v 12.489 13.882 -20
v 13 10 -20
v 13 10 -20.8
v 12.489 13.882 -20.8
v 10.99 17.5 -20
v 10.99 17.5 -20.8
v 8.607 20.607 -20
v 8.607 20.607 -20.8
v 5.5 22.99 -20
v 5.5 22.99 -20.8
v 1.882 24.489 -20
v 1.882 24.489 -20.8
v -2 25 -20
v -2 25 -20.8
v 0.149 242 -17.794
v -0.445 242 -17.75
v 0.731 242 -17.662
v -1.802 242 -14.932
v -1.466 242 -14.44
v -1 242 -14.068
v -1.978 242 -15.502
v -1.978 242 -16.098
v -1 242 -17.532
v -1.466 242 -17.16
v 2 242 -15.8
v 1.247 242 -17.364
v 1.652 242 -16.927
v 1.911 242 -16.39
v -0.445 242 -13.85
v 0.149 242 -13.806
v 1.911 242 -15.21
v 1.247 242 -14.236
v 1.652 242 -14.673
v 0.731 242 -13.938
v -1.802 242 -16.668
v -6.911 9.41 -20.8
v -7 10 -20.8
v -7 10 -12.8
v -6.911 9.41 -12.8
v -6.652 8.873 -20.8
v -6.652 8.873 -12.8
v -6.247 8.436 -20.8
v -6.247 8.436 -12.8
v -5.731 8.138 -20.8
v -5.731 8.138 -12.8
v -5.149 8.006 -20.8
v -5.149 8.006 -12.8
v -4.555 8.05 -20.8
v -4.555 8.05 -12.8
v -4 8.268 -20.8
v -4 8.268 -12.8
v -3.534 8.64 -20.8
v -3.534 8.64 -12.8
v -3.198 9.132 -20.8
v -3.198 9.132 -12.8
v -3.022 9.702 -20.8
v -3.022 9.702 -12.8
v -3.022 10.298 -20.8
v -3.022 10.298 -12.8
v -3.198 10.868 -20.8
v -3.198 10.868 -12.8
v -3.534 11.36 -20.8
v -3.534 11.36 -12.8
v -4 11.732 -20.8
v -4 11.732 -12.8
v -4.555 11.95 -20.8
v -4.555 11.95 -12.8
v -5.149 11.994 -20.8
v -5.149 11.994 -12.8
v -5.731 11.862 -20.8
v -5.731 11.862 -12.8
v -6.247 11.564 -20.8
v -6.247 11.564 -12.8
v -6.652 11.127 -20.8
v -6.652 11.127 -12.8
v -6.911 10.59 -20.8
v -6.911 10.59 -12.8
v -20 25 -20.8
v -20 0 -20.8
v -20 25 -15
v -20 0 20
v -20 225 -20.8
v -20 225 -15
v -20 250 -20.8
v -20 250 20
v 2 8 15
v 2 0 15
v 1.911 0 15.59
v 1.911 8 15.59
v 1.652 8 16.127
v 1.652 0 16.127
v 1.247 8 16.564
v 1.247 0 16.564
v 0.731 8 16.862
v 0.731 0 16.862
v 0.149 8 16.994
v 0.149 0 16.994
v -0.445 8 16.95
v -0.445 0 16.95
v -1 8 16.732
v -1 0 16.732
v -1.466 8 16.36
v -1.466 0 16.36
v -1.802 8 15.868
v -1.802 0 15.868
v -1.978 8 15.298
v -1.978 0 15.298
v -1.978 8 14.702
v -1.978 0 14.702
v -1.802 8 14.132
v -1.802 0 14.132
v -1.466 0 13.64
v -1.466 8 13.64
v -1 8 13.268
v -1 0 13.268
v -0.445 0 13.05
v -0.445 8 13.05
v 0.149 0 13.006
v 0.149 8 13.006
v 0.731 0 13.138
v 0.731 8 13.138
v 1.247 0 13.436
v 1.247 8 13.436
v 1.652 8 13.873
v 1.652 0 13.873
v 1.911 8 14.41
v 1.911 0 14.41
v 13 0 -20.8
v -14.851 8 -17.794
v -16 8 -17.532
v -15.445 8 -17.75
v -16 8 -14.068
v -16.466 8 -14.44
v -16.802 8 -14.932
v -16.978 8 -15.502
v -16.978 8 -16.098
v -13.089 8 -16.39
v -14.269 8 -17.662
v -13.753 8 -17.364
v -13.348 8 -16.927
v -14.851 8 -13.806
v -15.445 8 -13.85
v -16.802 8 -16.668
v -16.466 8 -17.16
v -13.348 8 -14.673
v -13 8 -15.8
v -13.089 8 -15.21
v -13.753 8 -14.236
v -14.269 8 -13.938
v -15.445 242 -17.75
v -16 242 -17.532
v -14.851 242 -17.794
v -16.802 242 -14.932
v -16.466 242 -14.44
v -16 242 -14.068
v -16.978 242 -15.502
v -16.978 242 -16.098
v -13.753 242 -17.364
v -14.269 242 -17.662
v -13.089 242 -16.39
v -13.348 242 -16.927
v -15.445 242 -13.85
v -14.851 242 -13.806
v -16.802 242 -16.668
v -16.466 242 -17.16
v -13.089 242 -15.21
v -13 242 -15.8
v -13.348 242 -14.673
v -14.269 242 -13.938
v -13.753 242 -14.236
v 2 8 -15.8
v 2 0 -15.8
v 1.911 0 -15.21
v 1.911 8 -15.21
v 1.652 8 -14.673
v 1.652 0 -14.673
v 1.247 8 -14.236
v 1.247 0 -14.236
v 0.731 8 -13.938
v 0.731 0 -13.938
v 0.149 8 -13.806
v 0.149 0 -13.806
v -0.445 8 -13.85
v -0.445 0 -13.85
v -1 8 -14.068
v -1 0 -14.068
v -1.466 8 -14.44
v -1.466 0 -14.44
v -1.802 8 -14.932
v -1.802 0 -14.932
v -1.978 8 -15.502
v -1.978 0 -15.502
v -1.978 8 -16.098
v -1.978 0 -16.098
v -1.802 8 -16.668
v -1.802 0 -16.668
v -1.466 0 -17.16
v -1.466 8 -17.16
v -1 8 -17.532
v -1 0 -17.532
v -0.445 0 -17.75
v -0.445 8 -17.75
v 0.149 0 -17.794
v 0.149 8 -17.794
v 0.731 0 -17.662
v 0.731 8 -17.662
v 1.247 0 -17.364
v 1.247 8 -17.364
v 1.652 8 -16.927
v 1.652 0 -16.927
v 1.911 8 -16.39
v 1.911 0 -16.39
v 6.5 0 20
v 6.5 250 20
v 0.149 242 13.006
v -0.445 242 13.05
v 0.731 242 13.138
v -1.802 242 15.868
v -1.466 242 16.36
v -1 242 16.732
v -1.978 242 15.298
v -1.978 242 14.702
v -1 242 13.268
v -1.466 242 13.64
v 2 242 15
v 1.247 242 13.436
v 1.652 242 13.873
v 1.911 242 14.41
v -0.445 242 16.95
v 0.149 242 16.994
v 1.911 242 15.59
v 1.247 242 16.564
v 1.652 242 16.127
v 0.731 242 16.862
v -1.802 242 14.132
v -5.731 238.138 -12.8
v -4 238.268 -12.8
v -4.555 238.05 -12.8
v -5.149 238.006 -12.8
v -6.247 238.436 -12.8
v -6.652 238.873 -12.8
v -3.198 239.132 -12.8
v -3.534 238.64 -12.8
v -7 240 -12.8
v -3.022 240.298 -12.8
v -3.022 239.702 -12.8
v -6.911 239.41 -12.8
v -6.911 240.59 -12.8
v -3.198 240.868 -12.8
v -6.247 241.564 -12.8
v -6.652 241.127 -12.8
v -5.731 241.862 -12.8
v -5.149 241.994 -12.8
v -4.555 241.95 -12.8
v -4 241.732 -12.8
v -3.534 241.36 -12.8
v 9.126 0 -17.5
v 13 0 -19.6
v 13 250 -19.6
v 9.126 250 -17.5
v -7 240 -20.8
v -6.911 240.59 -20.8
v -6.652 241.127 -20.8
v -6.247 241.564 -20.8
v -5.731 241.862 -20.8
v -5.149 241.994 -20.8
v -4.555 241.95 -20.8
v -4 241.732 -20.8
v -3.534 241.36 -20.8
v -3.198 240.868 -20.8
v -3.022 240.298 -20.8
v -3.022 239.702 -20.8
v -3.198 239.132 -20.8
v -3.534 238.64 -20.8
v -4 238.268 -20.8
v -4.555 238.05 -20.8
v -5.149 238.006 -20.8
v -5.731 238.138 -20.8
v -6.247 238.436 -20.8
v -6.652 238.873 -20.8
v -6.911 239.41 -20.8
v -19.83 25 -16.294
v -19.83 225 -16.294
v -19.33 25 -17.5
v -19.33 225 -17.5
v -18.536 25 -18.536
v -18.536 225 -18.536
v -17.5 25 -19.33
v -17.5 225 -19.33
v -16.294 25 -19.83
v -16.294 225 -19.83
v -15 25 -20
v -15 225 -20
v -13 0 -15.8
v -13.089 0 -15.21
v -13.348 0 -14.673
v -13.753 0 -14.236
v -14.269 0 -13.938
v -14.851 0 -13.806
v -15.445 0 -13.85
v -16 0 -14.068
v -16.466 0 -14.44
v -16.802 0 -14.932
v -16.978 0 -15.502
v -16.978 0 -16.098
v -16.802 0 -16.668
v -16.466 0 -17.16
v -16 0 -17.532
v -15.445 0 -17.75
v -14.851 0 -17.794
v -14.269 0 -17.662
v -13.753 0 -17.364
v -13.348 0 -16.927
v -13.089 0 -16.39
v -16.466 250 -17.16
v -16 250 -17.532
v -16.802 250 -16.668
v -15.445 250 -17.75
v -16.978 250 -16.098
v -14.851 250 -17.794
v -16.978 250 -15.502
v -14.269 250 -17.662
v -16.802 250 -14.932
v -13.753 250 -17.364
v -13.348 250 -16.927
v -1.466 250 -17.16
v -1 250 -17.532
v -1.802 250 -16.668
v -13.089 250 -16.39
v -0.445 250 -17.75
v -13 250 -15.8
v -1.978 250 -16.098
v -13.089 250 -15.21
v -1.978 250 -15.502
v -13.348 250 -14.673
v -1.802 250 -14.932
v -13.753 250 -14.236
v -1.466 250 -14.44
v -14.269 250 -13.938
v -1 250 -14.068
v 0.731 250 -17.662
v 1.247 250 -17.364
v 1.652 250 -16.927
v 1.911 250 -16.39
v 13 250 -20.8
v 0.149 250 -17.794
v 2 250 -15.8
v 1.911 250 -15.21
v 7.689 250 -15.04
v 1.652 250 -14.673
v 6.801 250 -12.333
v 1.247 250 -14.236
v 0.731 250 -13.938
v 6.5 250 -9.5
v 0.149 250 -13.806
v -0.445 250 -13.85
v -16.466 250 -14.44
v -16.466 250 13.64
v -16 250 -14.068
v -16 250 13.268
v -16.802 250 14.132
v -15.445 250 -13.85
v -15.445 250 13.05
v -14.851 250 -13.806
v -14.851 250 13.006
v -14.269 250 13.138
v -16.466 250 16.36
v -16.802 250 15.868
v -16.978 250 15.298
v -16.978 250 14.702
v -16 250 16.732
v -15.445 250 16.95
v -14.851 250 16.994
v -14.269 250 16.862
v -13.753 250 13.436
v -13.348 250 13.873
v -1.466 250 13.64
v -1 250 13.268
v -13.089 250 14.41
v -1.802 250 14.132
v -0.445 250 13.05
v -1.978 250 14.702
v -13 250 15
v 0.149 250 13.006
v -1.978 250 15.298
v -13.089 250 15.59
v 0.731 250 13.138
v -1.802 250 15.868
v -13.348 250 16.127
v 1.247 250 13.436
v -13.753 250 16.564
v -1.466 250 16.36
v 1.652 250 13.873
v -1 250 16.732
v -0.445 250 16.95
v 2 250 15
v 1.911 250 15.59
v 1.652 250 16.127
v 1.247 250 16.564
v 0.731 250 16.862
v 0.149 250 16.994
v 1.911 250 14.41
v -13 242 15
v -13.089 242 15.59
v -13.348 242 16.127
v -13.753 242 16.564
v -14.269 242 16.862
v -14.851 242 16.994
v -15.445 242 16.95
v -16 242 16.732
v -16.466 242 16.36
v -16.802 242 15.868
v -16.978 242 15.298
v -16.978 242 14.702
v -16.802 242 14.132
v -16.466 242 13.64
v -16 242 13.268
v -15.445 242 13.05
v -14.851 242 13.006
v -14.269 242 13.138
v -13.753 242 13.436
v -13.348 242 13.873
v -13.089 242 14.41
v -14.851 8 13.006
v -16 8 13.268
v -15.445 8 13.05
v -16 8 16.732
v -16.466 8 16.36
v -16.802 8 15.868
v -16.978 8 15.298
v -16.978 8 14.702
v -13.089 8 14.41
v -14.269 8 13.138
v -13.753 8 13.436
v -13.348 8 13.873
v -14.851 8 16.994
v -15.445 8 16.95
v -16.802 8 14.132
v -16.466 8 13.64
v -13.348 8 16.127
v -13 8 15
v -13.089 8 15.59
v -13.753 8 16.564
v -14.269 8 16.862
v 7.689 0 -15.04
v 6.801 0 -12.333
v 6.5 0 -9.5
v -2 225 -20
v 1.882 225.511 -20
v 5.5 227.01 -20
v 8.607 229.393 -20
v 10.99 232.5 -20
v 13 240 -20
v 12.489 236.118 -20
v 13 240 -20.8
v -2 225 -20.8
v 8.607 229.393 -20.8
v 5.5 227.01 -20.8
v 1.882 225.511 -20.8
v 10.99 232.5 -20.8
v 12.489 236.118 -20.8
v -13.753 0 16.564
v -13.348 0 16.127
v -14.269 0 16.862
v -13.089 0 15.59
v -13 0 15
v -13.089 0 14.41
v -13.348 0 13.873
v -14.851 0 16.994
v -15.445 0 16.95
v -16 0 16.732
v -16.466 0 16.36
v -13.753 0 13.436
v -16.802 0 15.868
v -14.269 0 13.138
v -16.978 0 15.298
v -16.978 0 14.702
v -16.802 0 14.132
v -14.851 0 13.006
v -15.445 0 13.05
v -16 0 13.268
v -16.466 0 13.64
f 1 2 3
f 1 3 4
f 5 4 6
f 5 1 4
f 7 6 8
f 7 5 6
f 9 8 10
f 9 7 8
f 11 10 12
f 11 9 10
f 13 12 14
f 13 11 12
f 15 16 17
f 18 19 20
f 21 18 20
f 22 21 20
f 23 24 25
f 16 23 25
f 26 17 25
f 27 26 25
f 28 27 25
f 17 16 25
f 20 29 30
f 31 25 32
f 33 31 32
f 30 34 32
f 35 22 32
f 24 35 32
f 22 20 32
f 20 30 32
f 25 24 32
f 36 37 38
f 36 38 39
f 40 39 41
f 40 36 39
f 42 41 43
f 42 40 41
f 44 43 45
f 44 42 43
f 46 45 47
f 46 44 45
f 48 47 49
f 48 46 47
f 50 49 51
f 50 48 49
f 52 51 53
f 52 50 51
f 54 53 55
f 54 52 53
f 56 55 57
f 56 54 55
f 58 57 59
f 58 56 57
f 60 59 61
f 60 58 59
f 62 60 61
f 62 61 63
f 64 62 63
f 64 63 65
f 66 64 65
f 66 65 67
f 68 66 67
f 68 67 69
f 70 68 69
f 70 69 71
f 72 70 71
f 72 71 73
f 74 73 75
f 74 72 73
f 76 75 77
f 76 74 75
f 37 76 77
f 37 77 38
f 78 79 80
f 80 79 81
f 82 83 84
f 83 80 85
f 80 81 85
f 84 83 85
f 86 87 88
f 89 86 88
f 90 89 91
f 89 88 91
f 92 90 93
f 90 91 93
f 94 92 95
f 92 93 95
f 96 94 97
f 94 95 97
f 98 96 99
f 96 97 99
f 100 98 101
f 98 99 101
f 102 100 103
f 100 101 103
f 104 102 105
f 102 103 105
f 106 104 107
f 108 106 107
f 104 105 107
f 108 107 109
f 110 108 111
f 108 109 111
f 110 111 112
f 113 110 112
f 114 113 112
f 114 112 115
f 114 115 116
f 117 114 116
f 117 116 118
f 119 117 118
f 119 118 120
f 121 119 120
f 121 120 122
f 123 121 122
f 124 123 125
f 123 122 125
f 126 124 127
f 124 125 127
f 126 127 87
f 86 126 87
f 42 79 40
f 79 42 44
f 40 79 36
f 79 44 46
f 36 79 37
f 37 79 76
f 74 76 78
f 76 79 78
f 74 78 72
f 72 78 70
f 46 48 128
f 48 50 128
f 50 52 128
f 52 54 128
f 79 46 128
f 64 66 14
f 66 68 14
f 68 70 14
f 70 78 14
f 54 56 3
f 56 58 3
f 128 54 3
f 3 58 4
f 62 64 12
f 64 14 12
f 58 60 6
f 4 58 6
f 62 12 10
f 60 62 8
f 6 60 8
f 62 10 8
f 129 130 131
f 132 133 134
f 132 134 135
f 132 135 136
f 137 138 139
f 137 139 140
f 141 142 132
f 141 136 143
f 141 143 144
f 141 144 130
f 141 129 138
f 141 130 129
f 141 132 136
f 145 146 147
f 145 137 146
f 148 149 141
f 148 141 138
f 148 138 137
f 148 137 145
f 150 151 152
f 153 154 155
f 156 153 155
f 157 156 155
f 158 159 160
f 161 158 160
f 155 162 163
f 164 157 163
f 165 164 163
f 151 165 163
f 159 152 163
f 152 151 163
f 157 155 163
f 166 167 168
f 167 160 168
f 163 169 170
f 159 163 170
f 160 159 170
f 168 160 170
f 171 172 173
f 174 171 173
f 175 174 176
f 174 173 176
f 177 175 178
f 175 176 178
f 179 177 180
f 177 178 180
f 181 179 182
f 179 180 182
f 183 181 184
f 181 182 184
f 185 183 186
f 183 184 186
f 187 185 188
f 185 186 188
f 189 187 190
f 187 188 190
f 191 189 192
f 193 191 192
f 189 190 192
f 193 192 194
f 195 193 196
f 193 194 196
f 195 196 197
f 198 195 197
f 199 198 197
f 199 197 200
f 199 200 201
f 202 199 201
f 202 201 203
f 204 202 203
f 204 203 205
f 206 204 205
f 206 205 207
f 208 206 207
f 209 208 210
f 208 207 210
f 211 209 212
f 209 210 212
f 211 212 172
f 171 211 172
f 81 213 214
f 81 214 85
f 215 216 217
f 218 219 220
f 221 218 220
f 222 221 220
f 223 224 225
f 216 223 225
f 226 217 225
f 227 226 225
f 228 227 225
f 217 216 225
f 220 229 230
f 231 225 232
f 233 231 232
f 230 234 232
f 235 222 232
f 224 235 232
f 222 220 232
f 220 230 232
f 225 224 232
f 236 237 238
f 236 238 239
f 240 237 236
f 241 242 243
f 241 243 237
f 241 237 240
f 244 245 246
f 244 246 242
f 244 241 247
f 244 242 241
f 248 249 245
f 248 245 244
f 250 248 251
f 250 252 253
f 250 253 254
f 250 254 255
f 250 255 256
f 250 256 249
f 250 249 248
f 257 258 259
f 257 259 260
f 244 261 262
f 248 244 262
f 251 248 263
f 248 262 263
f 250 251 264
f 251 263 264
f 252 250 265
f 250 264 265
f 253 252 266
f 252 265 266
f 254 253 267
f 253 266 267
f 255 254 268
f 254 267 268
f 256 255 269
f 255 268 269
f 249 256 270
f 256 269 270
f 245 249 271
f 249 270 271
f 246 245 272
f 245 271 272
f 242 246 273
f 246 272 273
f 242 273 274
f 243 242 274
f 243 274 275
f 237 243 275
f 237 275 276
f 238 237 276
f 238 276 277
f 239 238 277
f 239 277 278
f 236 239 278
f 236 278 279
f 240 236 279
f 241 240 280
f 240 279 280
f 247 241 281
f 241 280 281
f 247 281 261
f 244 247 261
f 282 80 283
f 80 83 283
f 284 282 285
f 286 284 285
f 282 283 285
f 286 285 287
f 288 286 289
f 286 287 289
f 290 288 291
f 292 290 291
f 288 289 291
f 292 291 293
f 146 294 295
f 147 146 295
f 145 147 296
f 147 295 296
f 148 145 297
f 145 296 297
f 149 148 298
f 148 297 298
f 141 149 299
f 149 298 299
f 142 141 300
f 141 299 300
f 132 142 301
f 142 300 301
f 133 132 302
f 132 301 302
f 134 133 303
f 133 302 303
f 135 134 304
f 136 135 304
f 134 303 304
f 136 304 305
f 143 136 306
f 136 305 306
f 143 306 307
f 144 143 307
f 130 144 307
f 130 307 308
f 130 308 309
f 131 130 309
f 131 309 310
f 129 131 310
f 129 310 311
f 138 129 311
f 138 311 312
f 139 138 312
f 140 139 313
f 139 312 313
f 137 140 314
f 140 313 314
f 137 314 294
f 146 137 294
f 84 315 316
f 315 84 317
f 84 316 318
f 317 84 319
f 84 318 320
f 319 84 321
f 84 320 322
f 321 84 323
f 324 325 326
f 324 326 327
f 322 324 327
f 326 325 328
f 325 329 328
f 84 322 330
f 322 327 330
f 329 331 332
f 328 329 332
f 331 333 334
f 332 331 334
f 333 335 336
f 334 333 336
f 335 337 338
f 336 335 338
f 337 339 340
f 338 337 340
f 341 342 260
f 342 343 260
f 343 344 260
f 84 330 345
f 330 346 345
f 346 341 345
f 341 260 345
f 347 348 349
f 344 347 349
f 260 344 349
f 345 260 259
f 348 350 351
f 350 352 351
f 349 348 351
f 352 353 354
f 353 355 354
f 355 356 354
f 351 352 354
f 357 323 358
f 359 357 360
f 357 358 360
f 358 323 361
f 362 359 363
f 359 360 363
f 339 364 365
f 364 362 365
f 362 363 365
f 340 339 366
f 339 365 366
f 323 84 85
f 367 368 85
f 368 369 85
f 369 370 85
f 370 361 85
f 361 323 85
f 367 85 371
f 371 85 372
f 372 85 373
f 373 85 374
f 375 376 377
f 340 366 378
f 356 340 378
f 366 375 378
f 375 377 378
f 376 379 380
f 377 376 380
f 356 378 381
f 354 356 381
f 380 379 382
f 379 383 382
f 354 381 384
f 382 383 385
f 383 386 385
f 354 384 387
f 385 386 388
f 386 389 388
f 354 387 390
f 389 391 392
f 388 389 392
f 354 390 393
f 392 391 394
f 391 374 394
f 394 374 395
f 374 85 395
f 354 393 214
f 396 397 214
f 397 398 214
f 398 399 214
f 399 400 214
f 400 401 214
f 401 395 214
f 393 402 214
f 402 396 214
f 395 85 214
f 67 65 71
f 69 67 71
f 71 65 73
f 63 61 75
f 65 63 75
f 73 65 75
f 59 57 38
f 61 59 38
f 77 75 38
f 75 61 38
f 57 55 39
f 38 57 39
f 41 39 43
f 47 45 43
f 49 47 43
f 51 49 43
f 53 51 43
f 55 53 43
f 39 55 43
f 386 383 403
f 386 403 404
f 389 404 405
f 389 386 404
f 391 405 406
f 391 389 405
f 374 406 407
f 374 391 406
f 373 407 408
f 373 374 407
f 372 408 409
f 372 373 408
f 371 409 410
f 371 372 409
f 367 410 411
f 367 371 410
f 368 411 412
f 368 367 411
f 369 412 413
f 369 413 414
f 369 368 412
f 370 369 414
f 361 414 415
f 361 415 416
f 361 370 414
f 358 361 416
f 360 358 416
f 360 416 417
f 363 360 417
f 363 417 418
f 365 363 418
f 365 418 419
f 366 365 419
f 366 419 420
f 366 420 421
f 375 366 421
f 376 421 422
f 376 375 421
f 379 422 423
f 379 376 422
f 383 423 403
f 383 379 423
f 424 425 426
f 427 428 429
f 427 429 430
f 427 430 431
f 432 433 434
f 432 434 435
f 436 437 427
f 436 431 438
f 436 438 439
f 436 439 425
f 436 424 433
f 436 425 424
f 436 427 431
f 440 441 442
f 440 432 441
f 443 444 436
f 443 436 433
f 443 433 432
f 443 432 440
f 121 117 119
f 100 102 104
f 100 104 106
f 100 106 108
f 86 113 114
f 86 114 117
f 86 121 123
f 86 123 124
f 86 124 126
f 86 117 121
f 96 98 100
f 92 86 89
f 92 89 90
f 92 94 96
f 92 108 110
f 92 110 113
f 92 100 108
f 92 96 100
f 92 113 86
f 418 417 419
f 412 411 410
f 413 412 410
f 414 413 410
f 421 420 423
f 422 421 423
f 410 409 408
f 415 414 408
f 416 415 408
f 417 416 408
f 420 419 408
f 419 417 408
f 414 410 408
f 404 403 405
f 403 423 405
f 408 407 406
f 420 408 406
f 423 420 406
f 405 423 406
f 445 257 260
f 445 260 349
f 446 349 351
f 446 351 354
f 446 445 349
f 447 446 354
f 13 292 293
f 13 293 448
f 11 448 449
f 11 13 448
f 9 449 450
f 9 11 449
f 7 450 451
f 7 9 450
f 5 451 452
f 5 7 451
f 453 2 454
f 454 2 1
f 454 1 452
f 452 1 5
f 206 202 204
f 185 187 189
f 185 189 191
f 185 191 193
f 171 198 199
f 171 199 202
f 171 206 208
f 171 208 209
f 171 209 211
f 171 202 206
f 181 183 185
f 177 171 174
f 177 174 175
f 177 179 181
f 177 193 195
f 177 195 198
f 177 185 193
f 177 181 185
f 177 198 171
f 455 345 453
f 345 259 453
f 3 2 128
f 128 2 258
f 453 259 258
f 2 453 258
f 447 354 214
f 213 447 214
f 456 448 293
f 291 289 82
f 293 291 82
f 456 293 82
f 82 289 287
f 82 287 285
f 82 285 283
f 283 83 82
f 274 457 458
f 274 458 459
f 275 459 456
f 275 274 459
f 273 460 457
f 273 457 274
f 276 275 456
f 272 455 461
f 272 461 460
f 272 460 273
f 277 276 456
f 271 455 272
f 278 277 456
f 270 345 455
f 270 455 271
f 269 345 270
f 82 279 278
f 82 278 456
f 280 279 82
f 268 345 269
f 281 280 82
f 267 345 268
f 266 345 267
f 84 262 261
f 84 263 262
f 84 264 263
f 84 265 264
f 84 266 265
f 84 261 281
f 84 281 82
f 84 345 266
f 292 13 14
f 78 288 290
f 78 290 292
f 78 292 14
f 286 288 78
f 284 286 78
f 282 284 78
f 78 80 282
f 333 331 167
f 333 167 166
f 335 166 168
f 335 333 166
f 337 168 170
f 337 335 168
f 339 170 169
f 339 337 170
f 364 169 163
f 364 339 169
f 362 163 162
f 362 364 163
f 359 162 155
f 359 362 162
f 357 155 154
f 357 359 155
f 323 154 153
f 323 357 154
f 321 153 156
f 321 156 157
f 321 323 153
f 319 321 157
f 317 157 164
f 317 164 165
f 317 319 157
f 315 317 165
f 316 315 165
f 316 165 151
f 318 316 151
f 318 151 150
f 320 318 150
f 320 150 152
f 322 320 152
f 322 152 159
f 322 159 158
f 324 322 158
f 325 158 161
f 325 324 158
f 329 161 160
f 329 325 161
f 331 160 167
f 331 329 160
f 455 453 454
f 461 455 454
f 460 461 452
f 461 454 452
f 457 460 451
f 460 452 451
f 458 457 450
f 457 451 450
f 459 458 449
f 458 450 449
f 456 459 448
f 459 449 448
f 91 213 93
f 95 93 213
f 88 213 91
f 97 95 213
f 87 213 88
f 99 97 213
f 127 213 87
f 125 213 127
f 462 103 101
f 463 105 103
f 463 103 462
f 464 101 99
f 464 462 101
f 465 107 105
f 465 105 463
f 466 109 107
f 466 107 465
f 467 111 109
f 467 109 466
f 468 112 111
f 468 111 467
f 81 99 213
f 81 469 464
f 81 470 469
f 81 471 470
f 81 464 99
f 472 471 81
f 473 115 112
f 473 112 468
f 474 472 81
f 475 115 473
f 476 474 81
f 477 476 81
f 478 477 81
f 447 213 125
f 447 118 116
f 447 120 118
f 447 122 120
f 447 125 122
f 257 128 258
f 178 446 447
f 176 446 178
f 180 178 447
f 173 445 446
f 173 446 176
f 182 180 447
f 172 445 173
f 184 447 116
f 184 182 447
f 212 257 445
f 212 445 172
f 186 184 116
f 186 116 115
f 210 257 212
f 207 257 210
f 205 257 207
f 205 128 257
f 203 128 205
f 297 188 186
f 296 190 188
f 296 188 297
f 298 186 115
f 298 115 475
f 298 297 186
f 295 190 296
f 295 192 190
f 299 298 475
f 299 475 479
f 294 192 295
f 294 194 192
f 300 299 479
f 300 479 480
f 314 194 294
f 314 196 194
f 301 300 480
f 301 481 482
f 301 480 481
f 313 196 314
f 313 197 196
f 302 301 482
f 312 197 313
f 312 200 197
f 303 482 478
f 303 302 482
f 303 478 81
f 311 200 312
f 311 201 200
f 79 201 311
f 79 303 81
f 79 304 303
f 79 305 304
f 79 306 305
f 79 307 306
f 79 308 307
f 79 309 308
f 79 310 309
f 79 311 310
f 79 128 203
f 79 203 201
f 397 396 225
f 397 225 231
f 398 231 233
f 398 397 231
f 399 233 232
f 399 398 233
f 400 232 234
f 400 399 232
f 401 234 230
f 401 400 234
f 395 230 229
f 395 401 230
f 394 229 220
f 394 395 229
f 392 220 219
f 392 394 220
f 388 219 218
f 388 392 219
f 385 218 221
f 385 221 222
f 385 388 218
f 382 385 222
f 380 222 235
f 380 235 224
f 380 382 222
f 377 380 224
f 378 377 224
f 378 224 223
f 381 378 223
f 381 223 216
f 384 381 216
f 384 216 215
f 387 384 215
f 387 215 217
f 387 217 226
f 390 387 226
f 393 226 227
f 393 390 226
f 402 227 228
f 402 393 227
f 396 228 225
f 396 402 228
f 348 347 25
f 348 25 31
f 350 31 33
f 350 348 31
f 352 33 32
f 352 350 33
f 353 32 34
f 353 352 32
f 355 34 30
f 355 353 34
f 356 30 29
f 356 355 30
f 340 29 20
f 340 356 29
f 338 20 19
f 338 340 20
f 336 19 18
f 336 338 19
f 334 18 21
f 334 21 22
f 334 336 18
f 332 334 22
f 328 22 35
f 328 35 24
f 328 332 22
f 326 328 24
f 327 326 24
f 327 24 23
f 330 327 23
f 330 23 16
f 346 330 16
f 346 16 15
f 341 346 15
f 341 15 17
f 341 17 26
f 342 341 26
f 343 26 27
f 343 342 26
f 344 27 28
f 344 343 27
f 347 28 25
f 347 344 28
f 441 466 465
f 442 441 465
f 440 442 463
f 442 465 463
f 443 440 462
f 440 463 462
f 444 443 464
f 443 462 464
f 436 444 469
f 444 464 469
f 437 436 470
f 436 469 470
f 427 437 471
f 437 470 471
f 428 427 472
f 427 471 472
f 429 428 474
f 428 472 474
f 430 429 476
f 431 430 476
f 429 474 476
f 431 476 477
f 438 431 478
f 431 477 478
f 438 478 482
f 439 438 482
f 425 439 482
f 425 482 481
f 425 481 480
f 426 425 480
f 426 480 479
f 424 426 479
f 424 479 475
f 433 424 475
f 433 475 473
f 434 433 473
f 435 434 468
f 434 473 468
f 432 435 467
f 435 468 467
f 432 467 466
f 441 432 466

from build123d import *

# Parameters (mm, degrees)
BOSS_EXTRUDE1_DEPTH = 250
BOSS_EXTRUDE2_DEPTH = 0.8
SKETCH3_R           = 2
CUT_EXTRUDE2_DEPTH  = 8
FILLET1_R           = 5
SKETCH4_R           = 2
CUT_EXTRUDE3_DEPTH  = 8


with BuildPart() as part:
    # Sketch1 → Boss-Extrude1 (new body)
    with BuildSketch(Plane(origin=(0, 0, 0), x_dir=(1, 0, 0), z_dir=(0, 1, 0))):
        with BuildLine():
            Line((6.5, 9.5), (6.5, -20))
            Line((6.5, -20), (-20, -20))
            Line((-20, -20), (-20, 20))
            Line((-20, 20), (13, 20))
            Line((13, 20), (13, 19.6))
            Line((13, 19.6), (9.125718415, 17.5))
            ThreePointArc((9.125718415, 17.5), (7.173215496, 13.709940534), (6.5, 9.5))
        make_face()
    extrude(amount=BOSS_EXTRUDE1_DEPTH)

    # Sketch2 → Boss-Extrude2 (add)
    with BuildSketch(Plane(origin=(0, 0, -20), x_dir=(-1, 0, 0), z_dir=(0, 0, -1))):
        with BuildLine():
            Line((20, 225), (20, 250))
            Line((20, 250), (-13, 250))
            Line((-13, 250), (-13, 240))
            ThreePointArc((-13, 240), (-8.606601718, 229.393398282), (2, 225))
            Line((2, 225), (20, 225))
        make_face()
        with BuildLine():
            Line((-13, 0), (-13, 10))
            ThreePointArc((-13, 10), (-8.606601718, 20.606601718), (2, 25))
            Line((2, 25), (20, 25))
            Line((20, 25), (20, 0))
            Line((20, 0), (-13, 0))
        make_face()
    extrude(amount=BOSS_EXTRUDE2_DEPTH)

    # Sketch3 → Cut-Extrude2 (cut)
    with BuildSketch(Plane.XZ):
        with Locations((-15, 15)):
            Circle(SKETCH3_R)
        with Locations((0, 15)):
            Circle(SKETCH3_R)
        with Locations((0, -15.8)):
            Circle(SKETCH3_R)
        with Locations((-15, -15.8)):
            Circle(SKETCH3_R)
    cut_extrude2 = extrude(amount=-CUT_EXTRUDE2_DEPTH, mode=Mode.SUBTRACT)

    # Mirror1: Cut-Extrude2 across plane
    add(cut_extrude2.mirror(Plane.ZX.offset(125)), mode=Mode.SUBTRACT)

    # Fillet1
    fillet1_edges = [part.edges().sort_by_distance(p)[0] for p in [
        (-20, 125, -20),
    ]]
    fillet(fillet1_edges, radius=FILLET1_R)

    # Sketch4 → Cut-Extrude3 (cut)
    with BuildSketch(Plane(origin=(0, 0, -20.8), x_dir=(-1, 0, 0), z_dir=(0, 0, -1))):
        with Locations((5, 240)):
            Circle(SKETCH4_R)
    cut_extrude3 = extrude(amount=-CUT_EXTRUDE3_DEPTH, mode=Mode.SUBTRACT)

    # Mirror2: Cut-Extrude3 across plane
    add(cut_extrude3.mirror(Plane.ZX.offset(125)), mode=Mode.SUBTRACT)


solid = part.part
